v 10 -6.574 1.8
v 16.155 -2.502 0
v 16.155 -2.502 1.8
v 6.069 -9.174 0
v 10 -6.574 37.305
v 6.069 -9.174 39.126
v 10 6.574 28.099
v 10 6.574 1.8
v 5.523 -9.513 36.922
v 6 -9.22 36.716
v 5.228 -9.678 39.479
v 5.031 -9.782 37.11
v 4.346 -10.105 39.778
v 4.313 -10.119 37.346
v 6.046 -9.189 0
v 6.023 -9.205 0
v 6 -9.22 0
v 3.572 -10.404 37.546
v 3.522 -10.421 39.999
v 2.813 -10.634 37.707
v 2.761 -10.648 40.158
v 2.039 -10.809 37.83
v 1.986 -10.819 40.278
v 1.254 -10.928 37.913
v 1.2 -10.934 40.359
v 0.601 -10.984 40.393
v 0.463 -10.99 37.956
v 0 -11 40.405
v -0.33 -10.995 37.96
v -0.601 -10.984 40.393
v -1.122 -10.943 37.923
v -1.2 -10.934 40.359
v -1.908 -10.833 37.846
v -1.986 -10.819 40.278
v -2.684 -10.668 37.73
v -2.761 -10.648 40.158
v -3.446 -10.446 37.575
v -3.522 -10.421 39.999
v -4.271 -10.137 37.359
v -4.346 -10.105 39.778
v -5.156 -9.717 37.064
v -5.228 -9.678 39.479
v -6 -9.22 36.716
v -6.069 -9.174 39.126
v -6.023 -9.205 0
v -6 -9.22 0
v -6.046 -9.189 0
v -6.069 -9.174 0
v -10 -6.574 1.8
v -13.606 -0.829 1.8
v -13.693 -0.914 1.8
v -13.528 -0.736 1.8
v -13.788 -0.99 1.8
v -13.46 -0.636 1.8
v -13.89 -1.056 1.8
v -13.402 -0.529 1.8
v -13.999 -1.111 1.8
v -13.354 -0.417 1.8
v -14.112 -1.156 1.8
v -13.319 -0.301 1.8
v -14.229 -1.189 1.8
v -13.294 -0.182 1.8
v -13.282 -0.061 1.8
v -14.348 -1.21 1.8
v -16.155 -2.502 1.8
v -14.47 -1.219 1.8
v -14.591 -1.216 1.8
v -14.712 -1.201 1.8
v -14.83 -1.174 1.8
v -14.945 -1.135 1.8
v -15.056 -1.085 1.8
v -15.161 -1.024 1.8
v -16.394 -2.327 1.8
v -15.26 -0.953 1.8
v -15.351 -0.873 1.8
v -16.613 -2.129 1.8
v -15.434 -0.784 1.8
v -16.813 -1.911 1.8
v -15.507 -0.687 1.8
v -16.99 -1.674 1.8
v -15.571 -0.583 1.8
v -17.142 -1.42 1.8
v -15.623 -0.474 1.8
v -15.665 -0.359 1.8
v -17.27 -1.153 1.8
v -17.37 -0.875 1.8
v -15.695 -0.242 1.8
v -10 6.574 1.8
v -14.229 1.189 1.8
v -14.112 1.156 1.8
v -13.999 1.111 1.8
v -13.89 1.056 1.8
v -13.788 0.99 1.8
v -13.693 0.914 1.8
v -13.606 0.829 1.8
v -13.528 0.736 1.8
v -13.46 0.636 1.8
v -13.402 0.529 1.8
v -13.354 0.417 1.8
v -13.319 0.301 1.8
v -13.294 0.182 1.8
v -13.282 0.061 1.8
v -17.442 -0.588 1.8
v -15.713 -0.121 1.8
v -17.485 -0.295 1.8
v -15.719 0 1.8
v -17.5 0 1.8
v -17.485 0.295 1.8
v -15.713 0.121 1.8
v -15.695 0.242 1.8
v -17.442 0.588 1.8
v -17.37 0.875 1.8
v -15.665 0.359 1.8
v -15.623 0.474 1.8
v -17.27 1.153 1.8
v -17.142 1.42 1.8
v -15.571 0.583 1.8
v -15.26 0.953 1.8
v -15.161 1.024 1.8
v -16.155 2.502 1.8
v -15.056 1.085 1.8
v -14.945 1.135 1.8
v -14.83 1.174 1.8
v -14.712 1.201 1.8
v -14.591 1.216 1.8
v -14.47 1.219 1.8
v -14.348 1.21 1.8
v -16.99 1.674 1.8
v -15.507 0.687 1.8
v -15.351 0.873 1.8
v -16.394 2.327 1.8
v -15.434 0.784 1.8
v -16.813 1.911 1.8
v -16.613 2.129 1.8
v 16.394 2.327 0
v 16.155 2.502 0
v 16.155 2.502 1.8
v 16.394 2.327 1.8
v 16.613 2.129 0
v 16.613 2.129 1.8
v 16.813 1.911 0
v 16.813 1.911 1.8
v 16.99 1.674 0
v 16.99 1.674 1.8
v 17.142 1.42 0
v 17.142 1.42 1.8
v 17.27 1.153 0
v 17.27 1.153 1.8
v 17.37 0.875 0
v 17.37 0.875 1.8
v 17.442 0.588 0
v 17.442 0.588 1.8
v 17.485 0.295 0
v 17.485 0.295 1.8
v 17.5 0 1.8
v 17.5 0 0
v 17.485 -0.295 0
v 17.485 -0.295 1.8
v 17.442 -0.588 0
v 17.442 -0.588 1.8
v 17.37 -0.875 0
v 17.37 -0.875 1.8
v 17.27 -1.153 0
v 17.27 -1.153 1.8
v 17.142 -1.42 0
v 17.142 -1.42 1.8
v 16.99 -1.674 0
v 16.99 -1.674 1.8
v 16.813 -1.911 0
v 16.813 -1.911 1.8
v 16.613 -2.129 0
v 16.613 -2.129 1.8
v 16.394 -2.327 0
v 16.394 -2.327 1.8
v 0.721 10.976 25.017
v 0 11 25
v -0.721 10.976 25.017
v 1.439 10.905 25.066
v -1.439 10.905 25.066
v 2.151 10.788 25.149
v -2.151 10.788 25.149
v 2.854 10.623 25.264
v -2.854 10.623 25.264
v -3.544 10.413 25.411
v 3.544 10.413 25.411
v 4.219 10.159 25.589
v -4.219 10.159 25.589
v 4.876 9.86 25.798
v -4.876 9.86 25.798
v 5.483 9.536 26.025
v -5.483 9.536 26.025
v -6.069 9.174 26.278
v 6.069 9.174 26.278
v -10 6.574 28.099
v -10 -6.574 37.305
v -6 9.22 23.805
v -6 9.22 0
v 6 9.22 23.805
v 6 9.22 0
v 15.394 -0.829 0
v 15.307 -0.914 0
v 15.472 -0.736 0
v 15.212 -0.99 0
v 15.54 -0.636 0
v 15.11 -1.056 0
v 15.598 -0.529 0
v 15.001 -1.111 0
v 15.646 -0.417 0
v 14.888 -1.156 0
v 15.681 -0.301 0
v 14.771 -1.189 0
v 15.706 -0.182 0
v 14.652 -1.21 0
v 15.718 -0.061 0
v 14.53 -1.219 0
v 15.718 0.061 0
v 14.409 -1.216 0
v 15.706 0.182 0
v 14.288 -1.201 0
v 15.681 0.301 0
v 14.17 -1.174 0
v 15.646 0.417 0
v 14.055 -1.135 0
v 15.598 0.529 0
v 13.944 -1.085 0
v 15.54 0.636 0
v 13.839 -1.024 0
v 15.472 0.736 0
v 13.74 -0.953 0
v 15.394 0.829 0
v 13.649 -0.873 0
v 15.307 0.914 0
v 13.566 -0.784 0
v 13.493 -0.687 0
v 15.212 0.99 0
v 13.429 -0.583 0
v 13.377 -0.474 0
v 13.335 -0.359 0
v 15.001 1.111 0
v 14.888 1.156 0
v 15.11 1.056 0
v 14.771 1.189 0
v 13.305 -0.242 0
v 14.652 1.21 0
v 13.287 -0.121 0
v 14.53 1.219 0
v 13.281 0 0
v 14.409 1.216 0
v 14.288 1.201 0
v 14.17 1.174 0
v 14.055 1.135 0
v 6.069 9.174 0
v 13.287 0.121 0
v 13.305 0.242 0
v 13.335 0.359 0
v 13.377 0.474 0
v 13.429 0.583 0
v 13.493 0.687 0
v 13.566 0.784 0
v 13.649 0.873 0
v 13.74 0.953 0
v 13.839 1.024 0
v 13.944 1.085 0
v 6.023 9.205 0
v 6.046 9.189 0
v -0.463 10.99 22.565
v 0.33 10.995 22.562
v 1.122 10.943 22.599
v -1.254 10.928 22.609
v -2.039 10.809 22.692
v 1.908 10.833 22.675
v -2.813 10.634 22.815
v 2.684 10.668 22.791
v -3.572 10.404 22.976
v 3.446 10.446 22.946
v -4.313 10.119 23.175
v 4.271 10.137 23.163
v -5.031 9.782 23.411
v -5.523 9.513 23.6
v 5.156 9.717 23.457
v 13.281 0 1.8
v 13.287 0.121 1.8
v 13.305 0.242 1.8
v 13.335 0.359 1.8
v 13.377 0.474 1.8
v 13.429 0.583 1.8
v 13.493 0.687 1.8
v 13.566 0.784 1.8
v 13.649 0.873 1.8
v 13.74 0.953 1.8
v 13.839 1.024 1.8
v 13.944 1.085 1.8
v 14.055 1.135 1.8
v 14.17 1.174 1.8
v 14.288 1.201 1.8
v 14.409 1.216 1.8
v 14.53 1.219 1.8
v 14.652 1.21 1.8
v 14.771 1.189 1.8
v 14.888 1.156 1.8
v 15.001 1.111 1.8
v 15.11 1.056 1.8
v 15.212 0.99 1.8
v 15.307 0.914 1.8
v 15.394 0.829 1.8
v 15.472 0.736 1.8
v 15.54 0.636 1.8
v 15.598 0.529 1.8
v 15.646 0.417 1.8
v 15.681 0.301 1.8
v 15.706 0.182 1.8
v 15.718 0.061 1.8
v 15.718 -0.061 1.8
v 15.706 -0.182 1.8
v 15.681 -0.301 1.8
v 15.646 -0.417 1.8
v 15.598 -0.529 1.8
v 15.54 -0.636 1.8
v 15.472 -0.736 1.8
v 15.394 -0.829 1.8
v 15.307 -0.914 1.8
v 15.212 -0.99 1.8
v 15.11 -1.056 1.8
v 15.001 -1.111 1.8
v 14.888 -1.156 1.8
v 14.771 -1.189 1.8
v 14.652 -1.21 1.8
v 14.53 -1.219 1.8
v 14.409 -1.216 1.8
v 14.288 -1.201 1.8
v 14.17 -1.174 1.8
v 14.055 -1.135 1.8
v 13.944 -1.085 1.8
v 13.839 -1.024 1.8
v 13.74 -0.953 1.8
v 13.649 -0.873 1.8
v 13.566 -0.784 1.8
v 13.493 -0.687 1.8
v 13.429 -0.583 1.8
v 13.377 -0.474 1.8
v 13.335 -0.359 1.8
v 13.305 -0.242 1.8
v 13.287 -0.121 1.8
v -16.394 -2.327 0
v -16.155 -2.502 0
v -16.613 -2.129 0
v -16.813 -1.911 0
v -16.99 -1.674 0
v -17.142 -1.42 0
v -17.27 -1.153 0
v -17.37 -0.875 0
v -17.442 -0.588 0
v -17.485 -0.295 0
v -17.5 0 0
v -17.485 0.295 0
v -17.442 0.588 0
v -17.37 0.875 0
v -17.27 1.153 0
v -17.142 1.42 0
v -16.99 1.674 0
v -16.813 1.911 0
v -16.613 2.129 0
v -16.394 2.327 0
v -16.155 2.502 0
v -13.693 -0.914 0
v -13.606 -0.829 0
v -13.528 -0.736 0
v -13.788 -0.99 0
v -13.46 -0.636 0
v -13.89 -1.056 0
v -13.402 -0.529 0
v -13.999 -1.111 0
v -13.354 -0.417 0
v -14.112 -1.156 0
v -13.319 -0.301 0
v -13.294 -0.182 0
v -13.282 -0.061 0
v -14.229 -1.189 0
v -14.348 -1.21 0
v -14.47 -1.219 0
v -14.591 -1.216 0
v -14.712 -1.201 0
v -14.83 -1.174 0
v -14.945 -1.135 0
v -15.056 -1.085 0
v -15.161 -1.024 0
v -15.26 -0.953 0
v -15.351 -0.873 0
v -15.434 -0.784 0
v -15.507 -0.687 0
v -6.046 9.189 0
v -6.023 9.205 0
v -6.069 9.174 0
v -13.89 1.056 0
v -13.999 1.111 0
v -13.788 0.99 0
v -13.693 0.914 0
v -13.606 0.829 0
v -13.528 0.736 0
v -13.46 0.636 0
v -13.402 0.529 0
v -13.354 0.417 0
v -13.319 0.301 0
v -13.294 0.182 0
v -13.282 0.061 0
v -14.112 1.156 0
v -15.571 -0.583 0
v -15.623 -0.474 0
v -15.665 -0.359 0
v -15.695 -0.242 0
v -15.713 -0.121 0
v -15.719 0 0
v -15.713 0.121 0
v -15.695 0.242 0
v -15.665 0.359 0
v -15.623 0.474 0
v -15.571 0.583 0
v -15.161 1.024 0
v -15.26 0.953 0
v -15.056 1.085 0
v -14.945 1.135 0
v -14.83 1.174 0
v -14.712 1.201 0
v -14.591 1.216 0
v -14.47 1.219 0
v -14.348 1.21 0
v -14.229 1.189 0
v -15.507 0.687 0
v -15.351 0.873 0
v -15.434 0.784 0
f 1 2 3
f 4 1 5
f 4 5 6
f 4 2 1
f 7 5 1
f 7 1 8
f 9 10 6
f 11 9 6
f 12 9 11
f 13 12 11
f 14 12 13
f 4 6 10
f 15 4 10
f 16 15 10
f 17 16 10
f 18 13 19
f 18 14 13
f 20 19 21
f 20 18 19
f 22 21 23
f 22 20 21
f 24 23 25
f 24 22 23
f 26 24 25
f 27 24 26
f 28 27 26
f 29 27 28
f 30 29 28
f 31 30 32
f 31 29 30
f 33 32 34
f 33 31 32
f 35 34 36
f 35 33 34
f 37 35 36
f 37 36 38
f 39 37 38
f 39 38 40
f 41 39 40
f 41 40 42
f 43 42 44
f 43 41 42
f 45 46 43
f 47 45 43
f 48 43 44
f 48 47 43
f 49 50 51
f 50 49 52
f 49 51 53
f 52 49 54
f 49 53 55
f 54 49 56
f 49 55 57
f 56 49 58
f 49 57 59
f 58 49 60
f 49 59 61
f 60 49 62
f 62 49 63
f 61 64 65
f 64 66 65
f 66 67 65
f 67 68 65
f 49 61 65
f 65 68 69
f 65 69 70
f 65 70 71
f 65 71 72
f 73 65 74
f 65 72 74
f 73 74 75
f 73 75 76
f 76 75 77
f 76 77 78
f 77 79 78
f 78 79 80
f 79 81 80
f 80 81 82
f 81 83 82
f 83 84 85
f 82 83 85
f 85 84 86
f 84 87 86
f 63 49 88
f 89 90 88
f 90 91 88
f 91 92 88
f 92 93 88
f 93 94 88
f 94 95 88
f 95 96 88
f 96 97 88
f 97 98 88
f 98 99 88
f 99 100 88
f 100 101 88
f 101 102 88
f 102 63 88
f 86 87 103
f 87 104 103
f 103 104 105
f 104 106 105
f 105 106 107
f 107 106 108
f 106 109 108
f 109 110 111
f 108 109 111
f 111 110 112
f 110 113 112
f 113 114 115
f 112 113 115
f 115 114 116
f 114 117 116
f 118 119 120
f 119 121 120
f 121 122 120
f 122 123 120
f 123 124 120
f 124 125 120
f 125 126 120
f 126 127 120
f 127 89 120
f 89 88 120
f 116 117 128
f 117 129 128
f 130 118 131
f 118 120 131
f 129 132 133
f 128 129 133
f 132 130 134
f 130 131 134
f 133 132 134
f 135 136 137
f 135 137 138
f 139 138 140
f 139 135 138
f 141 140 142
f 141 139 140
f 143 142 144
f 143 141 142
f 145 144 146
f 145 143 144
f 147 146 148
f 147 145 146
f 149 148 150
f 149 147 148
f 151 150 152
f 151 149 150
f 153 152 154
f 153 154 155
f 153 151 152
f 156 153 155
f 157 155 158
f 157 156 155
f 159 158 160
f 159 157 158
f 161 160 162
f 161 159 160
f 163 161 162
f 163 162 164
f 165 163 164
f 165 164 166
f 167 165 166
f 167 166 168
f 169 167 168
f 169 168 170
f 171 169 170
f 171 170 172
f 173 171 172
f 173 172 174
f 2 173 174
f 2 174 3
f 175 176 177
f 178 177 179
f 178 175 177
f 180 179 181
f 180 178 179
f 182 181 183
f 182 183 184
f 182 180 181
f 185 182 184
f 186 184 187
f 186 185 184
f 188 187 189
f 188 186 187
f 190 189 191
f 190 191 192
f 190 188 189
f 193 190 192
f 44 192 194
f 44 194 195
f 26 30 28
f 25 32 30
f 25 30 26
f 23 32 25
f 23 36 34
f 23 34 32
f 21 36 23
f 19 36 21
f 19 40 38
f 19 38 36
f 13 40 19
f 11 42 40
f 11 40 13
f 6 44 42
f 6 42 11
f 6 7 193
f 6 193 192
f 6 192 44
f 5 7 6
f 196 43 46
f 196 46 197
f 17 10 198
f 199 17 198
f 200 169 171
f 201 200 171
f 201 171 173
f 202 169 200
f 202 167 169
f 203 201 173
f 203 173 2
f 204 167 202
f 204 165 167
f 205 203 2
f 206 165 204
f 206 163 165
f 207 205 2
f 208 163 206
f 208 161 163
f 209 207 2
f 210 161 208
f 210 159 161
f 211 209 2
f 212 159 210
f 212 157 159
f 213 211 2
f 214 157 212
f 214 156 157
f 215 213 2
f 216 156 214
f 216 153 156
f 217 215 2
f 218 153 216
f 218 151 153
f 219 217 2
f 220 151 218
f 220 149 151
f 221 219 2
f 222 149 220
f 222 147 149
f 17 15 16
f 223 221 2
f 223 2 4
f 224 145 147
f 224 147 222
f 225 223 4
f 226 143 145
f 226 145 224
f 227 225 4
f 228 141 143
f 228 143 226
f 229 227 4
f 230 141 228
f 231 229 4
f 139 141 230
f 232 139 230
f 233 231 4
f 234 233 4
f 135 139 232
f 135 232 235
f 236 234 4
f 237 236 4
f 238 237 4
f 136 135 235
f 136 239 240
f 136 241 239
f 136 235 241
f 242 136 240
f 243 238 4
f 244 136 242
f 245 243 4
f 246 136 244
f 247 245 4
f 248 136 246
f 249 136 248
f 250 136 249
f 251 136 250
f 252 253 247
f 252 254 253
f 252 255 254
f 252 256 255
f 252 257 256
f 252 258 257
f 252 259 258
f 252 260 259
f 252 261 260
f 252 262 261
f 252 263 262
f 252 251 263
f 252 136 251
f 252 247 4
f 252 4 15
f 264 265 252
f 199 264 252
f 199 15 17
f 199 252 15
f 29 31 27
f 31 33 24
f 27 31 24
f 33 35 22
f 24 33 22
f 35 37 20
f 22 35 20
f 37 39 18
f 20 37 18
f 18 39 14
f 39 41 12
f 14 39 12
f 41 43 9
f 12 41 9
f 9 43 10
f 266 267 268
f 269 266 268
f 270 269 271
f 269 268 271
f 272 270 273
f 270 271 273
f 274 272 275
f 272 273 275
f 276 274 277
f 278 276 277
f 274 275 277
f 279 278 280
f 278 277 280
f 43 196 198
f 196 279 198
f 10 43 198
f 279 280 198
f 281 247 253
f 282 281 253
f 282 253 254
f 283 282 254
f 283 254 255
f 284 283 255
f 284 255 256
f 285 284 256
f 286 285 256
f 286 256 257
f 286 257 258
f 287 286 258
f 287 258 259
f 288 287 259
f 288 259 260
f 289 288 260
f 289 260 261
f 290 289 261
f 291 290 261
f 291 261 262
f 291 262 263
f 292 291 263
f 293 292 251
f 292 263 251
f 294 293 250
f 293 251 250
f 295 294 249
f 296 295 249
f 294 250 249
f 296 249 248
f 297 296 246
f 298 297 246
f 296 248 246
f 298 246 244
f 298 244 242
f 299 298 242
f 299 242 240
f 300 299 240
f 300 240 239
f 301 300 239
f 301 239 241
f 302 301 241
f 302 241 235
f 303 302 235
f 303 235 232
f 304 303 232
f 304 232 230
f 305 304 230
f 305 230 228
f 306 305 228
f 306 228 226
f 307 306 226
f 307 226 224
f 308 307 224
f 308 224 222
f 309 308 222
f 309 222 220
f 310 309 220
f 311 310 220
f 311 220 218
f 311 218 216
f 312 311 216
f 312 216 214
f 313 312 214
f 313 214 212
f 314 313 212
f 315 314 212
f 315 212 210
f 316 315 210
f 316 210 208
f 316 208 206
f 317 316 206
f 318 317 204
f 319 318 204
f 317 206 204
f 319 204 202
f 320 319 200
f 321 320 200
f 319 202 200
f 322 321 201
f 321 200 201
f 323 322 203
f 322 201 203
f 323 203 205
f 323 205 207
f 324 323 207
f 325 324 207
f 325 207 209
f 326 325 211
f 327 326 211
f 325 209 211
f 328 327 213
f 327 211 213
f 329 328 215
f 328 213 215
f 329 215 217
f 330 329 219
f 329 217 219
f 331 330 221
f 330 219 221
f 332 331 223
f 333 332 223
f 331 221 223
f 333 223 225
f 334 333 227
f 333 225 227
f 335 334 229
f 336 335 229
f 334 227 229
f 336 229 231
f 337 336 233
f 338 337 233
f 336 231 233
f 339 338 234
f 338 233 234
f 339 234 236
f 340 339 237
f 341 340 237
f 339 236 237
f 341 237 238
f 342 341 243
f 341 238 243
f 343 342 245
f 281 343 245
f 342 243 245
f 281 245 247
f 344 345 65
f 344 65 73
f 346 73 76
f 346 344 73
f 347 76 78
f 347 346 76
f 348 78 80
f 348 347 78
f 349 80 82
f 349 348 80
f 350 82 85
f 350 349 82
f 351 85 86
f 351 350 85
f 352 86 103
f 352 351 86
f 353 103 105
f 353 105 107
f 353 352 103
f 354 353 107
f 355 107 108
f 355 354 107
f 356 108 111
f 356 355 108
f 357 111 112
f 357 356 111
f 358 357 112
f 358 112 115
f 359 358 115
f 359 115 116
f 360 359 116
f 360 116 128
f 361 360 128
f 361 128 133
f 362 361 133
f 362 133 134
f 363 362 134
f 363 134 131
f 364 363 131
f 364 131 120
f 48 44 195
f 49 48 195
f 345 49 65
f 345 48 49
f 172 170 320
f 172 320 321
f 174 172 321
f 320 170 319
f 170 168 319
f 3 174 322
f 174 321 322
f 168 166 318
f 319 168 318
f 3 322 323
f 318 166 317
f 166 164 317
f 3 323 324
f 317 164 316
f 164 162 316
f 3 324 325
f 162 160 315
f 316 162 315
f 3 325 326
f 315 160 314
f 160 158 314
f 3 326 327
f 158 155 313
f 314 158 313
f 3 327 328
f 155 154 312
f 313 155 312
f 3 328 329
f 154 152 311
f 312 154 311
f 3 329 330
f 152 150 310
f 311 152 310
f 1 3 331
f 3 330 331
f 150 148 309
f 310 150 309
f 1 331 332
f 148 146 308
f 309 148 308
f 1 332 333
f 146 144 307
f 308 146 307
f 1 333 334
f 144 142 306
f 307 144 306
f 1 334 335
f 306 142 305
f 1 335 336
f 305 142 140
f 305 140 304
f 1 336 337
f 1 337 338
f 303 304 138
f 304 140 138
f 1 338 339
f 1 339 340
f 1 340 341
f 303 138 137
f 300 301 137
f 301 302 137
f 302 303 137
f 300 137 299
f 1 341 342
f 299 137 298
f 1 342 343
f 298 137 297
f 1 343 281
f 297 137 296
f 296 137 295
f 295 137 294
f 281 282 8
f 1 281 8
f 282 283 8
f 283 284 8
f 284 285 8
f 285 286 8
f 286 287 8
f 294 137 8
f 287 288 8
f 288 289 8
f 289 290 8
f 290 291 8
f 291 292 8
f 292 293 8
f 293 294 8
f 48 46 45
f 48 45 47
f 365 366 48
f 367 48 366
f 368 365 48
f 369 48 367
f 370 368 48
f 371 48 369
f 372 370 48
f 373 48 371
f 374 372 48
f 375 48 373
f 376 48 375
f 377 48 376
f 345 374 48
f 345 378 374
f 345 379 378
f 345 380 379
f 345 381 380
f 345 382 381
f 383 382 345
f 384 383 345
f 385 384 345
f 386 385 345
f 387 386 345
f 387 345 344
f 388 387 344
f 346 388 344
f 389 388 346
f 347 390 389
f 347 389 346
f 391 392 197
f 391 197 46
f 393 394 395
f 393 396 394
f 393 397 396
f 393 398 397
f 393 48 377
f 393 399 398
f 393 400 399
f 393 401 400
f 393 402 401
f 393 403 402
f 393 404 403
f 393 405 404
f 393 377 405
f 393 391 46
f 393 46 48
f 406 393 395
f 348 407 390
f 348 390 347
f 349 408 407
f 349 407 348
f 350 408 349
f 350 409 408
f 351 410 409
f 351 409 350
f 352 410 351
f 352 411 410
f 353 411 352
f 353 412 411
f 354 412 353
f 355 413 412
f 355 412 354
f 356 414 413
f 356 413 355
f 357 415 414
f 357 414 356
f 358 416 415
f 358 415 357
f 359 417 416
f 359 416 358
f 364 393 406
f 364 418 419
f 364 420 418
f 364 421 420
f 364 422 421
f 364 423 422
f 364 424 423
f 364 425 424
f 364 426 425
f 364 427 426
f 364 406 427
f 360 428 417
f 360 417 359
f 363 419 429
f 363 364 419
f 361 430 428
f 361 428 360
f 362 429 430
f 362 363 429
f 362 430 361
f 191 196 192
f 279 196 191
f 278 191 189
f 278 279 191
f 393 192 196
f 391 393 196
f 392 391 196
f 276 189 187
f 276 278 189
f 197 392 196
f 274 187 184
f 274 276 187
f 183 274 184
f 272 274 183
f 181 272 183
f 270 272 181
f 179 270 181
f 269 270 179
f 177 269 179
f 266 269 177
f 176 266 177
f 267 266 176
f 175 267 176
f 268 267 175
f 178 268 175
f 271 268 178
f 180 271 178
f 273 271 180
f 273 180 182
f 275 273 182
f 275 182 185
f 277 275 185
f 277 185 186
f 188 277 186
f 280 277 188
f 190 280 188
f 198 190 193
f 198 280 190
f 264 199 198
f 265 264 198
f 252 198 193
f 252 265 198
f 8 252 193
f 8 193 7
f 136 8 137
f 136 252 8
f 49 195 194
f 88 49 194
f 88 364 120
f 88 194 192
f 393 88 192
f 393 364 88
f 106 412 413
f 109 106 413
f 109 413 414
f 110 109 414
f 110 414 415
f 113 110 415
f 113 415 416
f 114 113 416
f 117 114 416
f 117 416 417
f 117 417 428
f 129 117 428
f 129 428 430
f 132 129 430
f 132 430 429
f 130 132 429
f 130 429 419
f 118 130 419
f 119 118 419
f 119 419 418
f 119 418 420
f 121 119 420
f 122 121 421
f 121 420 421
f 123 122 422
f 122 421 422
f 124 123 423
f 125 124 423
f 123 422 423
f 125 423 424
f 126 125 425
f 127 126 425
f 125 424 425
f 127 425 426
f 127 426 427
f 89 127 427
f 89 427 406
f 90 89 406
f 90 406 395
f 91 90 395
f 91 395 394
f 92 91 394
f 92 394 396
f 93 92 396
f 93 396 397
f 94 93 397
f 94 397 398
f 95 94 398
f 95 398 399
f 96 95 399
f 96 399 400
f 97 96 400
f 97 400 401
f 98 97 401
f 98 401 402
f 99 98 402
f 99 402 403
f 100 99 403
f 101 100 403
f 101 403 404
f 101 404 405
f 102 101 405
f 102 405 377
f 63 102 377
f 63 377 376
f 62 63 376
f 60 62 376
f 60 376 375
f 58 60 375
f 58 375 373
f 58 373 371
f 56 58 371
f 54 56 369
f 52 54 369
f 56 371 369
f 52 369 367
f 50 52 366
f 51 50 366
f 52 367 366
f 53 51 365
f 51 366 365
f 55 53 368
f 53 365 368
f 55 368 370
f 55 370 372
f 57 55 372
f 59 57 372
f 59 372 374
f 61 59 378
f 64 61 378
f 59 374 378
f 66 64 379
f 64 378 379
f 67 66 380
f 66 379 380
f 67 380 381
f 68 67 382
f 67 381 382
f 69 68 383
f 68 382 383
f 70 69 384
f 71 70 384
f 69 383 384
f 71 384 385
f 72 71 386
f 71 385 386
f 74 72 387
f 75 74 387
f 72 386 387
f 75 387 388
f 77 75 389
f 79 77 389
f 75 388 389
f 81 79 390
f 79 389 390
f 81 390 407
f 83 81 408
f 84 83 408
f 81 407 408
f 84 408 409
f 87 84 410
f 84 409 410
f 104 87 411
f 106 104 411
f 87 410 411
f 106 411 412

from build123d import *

# Parameters (mm, degrees)
BOSS_EXTRUDE1_DEPTH     = 45
SKETCH3_OUTSIDE_W       = 59.222
SKETCH3_OUTSIDE_H       = 36.222
CUT_EXTRUDE1_DEPTH      = 18.5
CUT_EXTRUDE1_DEPTH_BACK = 18.5
CUT_EXTRUDE2_START      = -1.8
SKETCH5_OUTSIDE_W       = 48.562
SKETCH5_OUTSIDE_H       = 35.562
SKETCH5_OUTSIDE_W_2     = 20
SKETCH5_OUTSIDE_H_2     = 24.414034222
CUT_EXTRUDE2_DEPTH      = 39.604565841
F_2_CLEARANCE_HOLE1_D   = 2.4384
CUT_EXTRUDE3_START      = -2
SKETCH8_W               = 12
SKETCH8_H               = 64.371558748
CUT_EXTRUDE3_DEPTH      = 32.097482707


with BuildPart() as part:
    # Sketch1 → Boss-Extrude1 (new body)
    with BuildSketch(Plane.XY):
        with BuildLine():
            Line((-16.155172414, 2.502079991), (-6.068965517, 9.1742933))
            ThreePointArc((-6.068965517, 9.1742933), (0, 11), (6.068965517, 9.1742933))
            Line((6.068965517, 9.1742933), (16.155172414, 2.502079991))
            ThreePointArc((16.155172414, 2.502079991), (17.5, 0), (16.155172414, -2.502079991))
            Line((16.155172414, -2.502079991), (6.068965517, -9.1742933))
            ThreePointArc((6.068965517, -9.1742933), (0, -11), (-6.068965517, -9.1742933))
            Line((-6.068965517, -9.1742933), (-16.155172414, -2.502079991))
            ThreePointArc((-16.155172414, -2.502079991), (-17.5, 0), (-16.155172414, 2.502079991))
        make_face()
    extrude(amount=BOSS_EXTRUDE1_DEPTH)

    # Sketch3 outside → Cut-Extrude1 (cut, two sides)
    with BuildSketch(Plane(origin=(0, 0, 0), x_dir=(0, 0, -1), z_dir=(1, 0, 0))) as cut_extrude1_sk:
        with Locations((-22.5, 0)):
            Rectangle(SKETCH3_OUTSIDE_W, SKETCH3_OUTSIDE_H)
        Polygon((-25, 11), (-40.404565841, -11), (0, -11), (0, 11), align=None, mode=Mode.SUBTRACT)
    extrude(amount=CUT_EXTRUDE1_DEPTH, mode=Mode.SUBTRACT)
    extrude(cut_extrude1_sk.sketch, amount=-CUT_EXTRUDE1_DEPTH_BACK, mode=Mode.SUBTRACT)

    # Sketch5 outside → Cut-Extrude2 (cut, through all)
    with BuildSketch(Plane(origin=(0, 0, 0), x_dir=(-1, 0, 0), z_dir=(0, 0, -1)).offset(CUT_EXTRUDE2_START)):
        Rectangle(SKETCH5_OUTSIDE_W, SKETCH5_OUTSIDE_H)
        Rectangle(SKETCH5_OUTSIDE_W_2, SKETCH5_OUTSIDE_H_2, mode=Mode.SUBTRACT)
    extrude(amount=-CUT_EXTRUDE2_DEPTH, mode=Mode.SUBTRACT)

    # #2 Clearance Hole1 (through all)
    with Locations(Plane.XY.offset(1.8)):
        with Locations((14.5, 0), (-14.5, 0)):
            Hole(F_2_CLEARANCE_HOLE1_D / 2)

    # Sketch8 → Cut-Extrude3 (cut, through all)
    with BuildSketch(Plane(origin=(0, 15.365046972, 21.943561206), x_dir=(1, 0, 0), z_dir=(0, 0.573576436, 0.819152044)).offset(CUT_EXTRUDE3_START)):
        Rectangle(SKETCH8_W, SKETCH8_H)
    extrude(amount=-CUT_EXTRUDE3_DEPTH, mode=Mode.SUBTRACT)


solid = part.part
